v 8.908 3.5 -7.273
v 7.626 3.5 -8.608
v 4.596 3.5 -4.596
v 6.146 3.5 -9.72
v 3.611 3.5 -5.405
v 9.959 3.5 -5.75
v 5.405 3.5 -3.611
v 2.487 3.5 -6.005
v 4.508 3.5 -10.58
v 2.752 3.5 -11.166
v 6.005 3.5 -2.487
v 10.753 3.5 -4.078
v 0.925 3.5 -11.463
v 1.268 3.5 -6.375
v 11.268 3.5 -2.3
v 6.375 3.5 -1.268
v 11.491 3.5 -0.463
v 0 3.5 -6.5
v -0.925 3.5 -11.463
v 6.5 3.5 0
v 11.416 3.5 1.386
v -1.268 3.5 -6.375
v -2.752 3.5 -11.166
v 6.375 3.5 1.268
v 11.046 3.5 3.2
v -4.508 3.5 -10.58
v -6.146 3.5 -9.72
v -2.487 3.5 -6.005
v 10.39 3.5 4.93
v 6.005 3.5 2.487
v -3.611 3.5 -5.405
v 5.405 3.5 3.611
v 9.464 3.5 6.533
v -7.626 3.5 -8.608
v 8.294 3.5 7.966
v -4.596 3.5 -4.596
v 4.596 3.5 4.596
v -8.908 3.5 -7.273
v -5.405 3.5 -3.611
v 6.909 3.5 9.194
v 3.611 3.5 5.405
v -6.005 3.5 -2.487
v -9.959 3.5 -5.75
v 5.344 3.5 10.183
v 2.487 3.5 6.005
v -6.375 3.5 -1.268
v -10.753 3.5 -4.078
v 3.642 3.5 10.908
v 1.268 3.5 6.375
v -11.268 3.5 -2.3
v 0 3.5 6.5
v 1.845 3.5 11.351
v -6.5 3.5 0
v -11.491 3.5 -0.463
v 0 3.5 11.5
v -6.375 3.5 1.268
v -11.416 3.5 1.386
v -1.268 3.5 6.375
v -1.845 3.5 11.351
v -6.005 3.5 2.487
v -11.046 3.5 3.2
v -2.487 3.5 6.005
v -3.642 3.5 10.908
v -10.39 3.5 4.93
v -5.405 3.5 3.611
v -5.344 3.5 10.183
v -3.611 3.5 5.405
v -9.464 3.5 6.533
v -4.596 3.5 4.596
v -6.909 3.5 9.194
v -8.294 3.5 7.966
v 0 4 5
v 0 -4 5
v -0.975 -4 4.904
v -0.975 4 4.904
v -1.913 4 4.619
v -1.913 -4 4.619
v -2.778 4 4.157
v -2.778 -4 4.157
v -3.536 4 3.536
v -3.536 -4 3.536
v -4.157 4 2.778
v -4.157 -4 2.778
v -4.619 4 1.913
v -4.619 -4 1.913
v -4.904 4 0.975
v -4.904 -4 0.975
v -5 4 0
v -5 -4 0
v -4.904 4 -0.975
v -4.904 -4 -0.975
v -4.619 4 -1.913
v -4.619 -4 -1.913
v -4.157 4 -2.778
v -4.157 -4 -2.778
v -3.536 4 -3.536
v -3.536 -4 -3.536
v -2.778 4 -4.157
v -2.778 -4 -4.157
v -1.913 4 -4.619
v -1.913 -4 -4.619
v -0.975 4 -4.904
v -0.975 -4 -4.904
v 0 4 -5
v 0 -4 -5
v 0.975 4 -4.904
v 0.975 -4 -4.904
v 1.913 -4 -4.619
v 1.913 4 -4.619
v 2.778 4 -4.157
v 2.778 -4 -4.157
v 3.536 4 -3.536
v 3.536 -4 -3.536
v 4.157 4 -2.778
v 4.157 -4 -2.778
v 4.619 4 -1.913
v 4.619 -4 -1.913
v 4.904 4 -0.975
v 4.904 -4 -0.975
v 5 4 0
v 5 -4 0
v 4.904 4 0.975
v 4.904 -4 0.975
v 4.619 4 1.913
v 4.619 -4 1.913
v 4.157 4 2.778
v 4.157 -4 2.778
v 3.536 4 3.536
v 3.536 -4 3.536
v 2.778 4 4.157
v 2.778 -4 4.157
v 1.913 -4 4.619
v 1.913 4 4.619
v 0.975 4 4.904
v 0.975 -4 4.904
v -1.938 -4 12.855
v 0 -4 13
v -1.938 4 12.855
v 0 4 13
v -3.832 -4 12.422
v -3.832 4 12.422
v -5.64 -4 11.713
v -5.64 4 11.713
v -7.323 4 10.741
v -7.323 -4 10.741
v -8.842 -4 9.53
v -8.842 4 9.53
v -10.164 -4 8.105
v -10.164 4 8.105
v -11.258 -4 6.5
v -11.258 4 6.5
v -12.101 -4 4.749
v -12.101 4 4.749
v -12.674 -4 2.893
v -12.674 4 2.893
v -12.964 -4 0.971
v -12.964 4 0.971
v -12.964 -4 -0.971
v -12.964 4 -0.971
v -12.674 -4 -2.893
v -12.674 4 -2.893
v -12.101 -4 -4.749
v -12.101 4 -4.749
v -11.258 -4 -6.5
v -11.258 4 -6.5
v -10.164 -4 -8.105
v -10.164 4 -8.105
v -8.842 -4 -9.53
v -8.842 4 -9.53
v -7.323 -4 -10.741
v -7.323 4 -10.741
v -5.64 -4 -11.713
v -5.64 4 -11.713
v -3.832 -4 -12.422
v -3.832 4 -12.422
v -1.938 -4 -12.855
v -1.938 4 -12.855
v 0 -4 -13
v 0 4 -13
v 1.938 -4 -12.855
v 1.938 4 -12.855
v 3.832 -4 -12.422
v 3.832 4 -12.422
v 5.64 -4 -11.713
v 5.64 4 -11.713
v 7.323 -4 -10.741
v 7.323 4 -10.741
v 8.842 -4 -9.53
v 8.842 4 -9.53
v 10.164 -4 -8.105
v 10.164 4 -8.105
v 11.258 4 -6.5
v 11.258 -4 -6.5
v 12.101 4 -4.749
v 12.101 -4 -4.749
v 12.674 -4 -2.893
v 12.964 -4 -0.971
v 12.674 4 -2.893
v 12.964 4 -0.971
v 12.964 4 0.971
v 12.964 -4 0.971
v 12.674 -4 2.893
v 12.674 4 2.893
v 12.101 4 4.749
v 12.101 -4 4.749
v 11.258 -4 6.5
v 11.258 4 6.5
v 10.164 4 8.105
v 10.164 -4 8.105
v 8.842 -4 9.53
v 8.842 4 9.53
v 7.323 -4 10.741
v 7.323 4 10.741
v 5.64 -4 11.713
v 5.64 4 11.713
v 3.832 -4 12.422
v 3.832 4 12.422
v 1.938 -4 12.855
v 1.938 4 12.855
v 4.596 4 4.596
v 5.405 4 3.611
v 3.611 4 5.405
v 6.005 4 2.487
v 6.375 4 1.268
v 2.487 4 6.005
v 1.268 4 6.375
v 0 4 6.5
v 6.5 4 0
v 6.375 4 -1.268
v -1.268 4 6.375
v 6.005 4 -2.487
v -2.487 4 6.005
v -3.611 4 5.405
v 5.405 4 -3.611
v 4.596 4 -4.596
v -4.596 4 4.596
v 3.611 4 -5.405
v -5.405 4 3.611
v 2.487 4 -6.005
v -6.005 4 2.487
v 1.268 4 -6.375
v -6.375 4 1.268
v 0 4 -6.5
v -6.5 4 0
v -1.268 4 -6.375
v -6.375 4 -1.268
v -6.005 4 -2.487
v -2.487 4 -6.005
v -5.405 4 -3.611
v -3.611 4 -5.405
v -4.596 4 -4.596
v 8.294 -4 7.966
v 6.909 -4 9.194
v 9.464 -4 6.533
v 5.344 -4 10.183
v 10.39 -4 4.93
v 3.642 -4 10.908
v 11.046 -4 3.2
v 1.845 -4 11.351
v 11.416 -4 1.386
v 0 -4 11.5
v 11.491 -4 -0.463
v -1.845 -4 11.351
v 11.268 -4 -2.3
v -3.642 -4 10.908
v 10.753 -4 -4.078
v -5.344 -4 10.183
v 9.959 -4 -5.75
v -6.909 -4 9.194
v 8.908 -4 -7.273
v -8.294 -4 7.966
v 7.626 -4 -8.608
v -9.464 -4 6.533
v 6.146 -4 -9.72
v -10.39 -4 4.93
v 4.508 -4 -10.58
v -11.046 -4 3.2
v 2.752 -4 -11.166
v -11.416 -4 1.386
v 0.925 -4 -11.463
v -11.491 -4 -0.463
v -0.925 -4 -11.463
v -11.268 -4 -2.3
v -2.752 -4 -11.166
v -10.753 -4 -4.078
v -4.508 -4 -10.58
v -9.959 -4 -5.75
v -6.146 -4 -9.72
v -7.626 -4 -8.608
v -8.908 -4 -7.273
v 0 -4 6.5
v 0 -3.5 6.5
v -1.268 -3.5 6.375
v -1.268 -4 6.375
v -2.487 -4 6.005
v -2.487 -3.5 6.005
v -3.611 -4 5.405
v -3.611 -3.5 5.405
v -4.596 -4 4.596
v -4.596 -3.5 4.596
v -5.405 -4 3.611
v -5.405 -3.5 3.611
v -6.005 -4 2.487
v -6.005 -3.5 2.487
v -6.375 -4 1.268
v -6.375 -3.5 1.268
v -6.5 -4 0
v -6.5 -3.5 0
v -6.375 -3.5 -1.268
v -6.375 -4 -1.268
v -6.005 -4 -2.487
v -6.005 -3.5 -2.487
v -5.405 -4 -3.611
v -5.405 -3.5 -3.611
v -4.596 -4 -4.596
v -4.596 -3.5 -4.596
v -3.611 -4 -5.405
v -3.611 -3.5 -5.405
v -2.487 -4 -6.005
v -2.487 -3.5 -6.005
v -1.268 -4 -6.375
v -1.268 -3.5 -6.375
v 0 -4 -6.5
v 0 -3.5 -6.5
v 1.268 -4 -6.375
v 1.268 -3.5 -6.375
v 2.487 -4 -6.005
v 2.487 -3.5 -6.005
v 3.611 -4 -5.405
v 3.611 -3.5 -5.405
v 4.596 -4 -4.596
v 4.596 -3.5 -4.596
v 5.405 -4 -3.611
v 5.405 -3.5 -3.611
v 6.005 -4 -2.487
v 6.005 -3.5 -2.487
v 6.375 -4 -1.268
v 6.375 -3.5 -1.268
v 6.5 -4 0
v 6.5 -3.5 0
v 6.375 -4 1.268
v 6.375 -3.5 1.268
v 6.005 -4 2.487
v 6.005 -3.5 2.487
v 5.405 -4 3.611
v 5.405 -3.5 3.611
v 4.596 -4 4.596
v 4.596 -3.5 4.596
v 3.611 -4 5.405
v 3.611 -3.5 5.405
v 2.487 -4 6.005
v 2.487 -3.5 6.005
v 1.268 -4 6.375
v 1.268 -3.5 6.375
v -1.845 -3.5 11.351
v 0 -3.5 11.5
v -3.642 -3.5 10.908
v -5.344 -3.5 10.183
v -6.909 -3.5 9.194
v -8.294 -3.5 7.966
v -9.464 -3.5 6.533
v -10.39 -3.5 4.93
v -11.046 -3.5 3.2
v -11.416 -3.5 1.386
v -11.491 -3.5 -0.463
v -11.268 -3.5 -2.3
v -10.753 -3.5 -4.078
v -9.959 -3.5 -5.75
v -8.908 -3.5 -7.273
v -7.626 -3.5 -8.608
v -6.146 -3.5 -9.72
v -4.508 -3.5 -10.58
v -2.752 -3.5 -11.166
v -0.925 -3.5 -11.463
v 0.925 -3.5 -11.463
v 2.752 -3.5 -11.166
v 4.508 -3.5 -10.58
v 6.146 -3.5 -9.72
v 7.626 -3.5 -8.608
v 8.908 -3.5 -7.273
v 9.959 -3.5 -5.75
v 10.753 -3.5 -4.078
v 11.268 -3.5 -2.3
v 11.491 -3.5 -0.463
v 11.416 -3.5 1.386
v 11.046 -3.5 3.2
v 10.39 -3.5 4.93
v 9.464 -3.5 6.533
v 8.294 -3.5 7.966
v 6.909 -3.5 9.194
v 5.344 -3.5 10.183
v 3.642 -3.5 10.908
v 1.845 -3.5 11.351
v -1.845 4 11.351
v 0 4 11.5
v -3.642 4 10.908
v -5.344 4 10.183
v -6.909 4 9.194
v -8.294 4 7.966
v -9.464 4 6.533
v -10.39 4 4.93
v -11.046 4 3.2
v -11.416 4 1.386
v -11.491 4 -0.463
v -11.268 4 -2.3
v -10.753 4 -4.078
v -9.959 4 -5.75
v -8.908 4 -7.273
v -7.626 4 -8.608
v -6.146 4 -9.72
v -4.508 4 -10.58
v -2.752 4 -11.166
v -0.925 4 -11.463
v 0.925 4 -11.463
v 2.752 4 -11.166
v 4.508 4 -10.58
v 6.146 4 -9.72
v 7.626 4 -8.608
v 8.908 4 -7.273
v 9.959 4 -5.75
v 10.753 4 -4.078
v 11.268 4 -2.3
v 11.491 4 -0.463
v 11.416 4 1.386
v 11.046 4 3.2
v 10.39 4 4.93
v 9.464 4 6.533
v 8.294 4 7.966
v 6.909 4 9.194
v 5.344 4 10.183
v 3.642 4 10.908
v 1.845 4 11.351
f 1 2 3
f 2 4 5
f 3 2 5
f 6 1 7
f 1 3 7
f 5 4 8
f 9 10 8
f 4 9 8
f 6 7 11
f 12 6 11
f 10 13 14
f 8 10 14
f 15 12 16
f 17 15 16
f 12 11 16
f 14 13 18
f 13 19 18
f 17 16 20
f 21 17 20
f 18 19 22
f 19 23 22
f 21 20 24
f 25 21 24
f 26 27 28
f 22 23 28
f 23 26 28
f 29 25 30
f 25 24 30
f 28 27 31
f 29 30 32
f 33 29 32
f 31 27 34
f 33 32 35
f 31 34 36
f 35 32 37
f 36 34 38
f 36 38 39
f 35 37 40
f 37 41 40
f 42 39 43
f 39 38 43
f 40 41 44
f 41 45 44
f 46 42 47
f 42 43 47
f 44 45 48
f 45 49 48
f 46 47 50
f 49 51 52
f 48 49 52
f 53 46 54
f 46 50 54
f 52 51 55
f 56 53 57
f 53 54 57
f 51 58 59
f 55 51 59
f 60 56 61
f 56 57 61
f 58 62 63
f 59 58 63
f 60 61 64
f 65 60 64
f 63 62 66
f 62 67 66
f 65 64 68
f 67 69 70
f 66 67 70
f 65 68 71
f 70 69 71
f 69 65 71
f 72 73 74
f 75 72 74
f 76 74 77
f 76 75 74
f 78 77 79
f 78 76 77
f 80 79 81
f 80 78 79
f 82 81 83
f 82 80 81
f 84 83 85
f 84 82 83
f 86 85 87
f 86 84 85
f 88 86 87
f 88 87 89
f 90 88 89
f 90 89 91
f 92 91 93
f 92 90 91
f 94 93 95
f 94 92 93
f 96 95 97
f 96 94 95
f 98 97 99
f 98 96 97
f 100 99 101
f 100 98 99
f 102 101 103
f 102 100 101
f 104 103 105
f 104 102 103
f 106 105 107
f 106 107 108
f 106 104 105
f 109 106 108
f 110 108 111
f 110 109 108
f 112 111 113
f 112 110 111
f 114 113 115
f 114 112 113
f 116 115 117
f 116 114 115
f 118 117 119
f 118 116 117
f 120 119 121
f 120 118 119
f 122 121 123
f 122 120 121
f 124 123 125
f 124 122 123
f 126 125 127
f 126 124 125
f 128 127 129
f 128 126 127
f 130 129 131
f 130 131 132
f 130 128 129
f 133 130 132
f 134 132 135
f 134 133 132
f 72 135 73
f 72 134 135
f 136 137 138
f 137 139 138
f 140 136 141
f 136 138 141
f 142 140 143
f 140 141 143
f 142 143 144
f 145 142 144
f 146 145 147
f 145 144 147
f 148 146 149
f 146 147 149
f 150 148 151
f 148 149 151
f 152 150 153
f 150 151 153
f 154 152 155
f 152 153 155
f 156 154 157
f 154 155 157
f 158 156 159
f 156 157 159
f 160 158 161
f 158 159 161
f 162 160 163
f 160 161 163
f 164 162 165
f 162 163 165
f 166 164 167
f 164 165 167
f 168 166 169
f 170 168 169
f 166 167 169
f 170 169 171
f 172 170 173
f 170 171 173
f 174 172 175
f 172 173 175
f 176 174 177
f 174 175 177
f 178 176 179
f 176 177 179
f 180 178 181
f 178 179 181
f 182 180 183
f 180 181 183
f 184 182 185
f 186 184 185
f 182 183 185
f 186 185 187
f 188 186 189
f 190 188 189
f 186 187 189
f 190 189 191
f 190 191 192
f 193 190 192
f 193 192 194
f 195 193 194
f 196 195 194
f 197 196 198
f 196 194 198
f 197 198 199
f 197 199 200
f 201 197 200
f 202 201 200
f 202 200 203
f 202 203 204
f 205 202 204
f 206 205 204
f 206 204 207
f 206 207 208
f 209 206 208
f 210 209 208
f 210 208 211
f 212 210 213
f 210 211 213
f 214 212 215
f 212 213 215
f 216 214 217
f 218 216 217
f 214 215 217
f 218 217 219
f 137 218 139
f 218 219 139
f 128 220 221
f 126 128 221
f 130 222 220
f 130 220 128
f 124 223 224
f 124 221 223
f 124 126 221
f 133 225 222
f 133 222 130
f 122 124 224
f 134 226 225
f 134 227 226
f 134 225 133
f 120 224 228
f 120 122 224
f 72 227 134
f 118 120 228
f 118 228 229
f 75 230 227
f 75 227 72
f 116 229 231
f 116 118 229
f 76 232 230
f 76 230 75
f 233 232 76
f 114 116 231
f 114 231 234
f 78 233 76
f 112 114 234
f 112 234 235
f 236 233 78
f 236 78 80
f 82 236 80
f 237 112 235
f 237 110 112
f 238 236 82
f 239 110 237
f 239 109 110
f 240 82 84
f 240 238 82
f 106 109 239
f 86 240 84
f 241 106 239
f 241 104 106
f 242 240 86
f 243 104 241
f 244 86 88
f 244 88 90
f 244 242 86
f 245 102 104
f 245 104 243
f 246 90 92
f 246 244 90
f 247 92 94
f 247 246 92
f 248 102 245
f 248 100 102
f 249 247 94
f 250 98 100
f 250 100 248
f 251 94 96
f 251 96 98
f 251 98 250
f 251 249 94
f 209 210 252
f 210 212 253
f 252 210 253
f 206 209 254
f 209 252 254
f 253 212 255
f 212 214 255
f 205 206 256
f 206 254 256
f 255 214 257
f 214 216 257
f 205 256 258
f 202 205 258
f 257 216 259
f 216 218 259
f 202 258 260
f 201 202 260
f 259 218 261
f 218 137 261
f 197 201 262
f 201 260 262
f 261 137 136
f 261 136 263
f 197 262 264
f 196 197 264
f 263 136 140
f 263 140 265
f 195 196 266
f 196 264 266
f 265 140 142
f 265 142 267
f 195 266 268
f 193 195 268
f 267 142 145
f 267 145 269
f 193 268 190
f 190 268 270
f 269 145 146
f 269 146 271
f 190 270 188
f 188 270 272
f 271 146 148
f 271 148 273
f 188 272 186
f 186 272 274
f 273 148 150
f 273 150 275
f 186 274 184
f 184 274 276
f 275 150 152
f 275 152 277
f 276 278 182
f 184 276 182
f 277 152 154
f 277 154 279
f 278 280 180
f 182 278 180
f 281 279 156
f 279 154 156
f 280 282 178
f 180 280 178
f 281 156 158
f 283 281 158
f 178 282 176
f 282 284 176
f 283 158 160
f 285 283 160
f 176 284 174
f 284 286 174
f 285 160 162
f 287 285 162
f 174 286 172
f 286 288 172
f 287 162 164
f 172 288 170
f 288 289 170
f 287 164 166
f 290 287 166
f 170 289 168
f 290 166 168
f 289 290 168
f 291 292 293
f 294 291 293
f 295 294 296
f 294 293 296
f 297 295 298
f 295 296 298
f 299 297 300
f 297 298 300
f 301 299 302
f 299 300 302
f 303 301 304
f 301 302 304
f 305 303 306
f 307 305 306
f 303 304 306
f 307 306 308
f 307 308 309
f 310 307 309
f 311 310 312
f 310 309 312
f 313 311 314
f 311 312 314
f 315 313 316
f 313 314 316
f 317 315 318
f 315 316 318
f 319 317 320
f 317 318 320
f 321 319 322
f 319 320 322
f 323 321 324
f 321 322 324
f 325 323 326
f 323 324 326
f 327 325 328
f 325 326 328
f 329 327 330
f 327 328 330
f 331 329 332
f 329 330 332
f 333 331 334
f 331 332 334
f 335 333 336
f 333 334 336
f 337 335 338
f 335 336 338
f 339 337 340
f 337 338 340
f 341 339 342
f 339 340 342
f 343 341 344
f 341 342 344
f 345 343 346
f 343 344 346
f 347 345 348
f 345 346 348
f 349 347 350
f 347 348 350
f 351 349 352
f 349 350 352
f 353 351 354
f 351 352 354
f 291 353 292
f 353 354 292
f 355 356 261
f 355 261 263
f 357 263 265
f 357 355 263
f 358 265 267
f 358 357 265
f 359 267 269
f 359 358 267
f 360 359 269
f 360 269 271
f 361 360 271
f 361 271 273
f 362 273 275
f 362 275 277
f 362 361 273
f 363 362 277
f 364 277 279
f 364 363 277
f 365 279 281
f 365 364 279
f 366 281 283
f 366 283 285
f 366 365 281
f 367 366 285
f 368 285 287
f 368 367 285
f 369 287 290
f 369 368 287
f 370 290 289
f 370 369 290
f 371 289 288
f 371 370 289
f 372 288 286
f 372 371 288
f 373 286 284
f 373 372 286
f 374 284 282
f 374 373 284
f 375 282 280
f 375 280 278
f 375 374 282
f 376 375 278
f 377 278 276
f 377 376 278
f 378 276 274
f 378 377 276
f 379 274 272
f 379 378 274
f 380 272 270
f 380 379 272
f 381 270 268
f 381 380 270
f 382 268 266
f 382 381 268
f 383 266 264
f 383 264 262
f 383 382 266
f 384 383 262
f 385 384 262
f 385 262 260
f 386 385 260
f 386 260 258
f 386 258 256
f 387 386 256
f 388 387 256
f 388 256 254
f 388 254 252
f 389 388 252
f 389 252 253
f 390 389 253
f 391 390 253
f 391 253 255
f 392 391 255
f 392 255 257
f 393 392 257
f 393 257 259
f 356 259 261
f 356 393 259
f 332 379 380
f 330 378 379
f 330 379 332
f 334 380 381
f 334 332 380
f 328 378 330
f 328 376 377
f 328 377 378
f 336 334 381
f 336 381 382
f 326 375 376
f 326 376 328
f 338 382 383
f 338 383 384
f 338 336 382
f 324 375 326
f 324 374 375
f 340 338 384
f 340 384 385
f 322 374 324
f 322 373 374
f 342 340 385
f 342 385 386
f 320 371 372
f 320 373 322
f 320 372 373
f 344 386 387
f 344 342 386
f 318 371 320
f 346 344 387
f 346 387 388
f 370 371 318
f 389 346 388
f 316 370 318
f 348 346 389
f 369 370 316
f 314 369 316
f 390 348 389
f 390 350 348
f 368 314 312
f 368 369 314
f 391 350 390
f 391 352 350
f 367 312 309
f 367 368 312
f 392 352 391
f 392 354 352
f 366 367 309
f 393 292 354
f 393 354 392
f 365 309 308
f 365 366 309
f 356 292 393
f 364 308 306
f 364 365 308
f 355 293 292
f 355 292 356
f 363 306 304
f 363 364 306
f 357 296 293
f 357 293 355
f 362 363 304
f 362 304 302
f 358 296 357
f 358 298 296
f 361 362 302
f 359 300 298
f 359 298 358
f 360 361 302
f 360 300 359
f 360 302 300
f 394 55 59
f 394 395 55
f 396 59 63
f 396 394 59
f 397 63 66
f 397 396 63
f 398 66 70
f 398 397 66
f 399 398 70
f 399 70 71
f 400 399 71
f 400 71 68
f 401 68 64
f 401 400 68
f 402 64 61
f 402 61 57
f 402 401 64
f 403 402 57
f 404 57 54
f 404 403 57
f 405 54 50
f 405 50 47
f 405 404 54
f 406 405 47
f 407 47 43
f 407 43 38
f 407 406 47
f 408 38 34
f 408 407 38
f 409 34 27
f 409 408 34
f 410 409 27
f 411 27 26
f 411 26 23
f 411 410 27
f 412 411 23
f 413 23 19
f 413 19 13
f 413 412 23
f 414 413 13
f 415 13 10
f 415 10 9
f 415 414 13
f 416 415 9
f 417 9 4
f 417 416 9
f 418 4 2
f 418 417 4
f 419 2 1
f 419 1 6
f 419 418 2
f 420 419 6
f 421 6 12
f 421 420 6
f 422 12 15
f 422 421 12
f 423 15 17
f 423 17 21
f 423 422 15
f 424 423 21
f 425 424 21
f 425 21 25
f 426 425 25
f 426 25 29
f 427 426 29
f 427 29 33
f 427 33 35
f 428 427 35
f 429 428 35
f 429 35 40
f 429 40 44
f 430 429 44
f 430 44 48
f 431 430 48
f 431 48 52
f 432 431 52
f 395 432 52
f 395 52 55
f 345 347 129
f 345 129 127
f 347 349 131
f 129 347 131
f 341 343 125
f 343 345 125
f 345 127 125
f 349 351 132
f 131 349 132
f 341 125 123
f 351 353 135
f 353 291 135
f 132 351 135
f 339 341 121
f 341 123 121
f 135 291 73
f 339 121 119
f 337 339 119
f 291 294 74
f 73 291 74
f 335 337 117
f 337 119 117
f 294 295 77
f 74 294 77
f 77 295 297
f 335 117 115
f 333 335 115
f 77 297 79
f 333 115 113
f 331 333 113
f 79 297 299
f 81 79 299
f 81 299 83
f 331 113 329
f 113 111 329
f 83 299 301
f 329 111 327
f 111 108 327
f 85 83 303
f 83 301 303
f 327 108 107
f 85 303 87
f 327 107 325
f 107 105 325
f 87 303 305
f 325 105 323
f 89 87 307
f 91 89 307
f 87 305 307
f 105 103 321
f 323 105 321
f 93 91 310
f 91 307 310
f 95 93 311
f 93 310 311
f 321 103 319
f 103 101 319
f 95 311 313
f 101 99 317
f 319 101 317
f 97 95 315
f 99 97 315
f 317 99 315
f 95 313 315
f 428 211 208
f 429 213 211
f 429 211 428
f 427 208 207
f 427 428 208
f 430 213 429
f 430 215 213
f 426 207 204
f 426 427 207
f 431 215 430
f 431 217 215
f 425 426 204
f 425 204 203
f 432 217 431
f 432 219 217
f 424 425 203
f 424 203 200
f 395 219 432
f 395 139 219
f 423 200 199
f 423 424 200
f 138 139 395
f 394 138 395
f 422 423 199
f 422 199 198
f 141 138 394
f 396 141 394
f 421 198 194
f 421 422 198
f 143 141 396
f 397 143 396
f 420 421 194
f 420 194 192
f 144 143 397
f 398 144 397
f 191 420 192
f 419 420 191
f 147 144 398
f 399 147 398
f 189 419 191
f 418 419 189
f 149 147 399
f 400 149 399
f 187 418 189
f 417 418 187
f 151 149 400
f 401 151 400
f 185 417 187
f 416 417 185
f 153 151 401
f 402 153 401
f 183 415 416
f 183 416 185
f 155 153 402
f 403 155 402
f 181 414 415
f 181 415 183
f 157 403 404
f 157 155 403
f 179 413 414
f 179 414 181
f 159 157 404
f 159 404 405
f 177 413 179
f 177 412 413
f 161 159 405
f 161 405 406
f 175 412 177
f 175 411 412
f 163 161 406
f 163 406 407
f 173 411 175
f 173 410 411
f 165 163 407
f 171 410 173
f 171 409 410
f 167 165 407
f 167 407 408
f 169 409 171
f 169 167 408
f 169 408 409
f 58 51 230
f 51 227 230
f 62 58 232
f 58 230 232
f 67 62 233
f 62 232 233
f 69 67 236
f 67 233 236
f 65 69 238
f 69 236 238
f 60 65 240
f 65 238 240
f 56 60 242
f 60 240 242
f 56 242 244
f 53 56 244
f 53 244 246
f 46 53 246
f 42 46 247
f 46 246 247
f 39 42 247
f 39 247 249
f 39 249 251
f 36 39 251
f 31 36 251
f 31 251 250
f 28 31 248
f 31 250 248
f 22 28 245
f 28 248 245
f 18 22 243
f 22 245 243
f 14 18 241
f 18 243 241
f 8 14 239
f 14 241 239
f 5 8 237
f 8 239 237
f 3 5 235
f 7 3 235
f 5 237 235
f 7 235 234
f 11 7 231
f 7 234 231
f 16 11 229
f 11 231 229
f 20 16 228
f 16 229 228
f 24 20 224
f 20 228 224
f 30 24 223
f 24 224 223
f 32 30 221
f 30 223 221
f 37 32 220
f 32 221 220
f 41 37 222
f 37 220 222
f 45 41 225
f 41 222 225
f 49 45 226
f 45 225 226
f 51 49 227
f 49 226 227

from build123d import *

# Parameters (mm, degrees)
ESBO_O1_W = 1.5
ESBO_O1_H = 8
ESBO_O4_W = 5
ESBO_O4_H = 7


with BuildPart() as part:
    # Esboço1 → Revolução1 (revolve)
    with BuildSketch(Plane.XY, mode=Mode.PRIVATE) as revolu_o1_sk:
        with Locations((5.75, 0)):
            Rectangle(ESBO_O1_W, ESBO_O1_H)
        with Locations((12.25, 0)):
            Rectangle(ESBO_O1_W, ESBO_O1_H)
    revolve(revolu_o1_sk.sketch.rotate(Axis((0, 7.601094967, 0), (0, -1, 0)), 90), axis=Axis((0, 7.601094967, 0), (0, -1, 0)))

    # Esboço4 → Revolução2 (revolve)
    with BuildSketch(Plane.XY, mode=Mode.PRIVATE) as revolu_o2_sk:
        with Locations((-9, 0)):
            Rectangle(ESBO_O4_W, ESBO_O4_H)
    revolve(revolu_o2_sk.sketch.rotate(Axis((0, 5.982287702, 0), (0, -1, 0)), 270), axis=Axis((0, 5.982287702, 0), (0, -1, 0)))


solid = part.part
